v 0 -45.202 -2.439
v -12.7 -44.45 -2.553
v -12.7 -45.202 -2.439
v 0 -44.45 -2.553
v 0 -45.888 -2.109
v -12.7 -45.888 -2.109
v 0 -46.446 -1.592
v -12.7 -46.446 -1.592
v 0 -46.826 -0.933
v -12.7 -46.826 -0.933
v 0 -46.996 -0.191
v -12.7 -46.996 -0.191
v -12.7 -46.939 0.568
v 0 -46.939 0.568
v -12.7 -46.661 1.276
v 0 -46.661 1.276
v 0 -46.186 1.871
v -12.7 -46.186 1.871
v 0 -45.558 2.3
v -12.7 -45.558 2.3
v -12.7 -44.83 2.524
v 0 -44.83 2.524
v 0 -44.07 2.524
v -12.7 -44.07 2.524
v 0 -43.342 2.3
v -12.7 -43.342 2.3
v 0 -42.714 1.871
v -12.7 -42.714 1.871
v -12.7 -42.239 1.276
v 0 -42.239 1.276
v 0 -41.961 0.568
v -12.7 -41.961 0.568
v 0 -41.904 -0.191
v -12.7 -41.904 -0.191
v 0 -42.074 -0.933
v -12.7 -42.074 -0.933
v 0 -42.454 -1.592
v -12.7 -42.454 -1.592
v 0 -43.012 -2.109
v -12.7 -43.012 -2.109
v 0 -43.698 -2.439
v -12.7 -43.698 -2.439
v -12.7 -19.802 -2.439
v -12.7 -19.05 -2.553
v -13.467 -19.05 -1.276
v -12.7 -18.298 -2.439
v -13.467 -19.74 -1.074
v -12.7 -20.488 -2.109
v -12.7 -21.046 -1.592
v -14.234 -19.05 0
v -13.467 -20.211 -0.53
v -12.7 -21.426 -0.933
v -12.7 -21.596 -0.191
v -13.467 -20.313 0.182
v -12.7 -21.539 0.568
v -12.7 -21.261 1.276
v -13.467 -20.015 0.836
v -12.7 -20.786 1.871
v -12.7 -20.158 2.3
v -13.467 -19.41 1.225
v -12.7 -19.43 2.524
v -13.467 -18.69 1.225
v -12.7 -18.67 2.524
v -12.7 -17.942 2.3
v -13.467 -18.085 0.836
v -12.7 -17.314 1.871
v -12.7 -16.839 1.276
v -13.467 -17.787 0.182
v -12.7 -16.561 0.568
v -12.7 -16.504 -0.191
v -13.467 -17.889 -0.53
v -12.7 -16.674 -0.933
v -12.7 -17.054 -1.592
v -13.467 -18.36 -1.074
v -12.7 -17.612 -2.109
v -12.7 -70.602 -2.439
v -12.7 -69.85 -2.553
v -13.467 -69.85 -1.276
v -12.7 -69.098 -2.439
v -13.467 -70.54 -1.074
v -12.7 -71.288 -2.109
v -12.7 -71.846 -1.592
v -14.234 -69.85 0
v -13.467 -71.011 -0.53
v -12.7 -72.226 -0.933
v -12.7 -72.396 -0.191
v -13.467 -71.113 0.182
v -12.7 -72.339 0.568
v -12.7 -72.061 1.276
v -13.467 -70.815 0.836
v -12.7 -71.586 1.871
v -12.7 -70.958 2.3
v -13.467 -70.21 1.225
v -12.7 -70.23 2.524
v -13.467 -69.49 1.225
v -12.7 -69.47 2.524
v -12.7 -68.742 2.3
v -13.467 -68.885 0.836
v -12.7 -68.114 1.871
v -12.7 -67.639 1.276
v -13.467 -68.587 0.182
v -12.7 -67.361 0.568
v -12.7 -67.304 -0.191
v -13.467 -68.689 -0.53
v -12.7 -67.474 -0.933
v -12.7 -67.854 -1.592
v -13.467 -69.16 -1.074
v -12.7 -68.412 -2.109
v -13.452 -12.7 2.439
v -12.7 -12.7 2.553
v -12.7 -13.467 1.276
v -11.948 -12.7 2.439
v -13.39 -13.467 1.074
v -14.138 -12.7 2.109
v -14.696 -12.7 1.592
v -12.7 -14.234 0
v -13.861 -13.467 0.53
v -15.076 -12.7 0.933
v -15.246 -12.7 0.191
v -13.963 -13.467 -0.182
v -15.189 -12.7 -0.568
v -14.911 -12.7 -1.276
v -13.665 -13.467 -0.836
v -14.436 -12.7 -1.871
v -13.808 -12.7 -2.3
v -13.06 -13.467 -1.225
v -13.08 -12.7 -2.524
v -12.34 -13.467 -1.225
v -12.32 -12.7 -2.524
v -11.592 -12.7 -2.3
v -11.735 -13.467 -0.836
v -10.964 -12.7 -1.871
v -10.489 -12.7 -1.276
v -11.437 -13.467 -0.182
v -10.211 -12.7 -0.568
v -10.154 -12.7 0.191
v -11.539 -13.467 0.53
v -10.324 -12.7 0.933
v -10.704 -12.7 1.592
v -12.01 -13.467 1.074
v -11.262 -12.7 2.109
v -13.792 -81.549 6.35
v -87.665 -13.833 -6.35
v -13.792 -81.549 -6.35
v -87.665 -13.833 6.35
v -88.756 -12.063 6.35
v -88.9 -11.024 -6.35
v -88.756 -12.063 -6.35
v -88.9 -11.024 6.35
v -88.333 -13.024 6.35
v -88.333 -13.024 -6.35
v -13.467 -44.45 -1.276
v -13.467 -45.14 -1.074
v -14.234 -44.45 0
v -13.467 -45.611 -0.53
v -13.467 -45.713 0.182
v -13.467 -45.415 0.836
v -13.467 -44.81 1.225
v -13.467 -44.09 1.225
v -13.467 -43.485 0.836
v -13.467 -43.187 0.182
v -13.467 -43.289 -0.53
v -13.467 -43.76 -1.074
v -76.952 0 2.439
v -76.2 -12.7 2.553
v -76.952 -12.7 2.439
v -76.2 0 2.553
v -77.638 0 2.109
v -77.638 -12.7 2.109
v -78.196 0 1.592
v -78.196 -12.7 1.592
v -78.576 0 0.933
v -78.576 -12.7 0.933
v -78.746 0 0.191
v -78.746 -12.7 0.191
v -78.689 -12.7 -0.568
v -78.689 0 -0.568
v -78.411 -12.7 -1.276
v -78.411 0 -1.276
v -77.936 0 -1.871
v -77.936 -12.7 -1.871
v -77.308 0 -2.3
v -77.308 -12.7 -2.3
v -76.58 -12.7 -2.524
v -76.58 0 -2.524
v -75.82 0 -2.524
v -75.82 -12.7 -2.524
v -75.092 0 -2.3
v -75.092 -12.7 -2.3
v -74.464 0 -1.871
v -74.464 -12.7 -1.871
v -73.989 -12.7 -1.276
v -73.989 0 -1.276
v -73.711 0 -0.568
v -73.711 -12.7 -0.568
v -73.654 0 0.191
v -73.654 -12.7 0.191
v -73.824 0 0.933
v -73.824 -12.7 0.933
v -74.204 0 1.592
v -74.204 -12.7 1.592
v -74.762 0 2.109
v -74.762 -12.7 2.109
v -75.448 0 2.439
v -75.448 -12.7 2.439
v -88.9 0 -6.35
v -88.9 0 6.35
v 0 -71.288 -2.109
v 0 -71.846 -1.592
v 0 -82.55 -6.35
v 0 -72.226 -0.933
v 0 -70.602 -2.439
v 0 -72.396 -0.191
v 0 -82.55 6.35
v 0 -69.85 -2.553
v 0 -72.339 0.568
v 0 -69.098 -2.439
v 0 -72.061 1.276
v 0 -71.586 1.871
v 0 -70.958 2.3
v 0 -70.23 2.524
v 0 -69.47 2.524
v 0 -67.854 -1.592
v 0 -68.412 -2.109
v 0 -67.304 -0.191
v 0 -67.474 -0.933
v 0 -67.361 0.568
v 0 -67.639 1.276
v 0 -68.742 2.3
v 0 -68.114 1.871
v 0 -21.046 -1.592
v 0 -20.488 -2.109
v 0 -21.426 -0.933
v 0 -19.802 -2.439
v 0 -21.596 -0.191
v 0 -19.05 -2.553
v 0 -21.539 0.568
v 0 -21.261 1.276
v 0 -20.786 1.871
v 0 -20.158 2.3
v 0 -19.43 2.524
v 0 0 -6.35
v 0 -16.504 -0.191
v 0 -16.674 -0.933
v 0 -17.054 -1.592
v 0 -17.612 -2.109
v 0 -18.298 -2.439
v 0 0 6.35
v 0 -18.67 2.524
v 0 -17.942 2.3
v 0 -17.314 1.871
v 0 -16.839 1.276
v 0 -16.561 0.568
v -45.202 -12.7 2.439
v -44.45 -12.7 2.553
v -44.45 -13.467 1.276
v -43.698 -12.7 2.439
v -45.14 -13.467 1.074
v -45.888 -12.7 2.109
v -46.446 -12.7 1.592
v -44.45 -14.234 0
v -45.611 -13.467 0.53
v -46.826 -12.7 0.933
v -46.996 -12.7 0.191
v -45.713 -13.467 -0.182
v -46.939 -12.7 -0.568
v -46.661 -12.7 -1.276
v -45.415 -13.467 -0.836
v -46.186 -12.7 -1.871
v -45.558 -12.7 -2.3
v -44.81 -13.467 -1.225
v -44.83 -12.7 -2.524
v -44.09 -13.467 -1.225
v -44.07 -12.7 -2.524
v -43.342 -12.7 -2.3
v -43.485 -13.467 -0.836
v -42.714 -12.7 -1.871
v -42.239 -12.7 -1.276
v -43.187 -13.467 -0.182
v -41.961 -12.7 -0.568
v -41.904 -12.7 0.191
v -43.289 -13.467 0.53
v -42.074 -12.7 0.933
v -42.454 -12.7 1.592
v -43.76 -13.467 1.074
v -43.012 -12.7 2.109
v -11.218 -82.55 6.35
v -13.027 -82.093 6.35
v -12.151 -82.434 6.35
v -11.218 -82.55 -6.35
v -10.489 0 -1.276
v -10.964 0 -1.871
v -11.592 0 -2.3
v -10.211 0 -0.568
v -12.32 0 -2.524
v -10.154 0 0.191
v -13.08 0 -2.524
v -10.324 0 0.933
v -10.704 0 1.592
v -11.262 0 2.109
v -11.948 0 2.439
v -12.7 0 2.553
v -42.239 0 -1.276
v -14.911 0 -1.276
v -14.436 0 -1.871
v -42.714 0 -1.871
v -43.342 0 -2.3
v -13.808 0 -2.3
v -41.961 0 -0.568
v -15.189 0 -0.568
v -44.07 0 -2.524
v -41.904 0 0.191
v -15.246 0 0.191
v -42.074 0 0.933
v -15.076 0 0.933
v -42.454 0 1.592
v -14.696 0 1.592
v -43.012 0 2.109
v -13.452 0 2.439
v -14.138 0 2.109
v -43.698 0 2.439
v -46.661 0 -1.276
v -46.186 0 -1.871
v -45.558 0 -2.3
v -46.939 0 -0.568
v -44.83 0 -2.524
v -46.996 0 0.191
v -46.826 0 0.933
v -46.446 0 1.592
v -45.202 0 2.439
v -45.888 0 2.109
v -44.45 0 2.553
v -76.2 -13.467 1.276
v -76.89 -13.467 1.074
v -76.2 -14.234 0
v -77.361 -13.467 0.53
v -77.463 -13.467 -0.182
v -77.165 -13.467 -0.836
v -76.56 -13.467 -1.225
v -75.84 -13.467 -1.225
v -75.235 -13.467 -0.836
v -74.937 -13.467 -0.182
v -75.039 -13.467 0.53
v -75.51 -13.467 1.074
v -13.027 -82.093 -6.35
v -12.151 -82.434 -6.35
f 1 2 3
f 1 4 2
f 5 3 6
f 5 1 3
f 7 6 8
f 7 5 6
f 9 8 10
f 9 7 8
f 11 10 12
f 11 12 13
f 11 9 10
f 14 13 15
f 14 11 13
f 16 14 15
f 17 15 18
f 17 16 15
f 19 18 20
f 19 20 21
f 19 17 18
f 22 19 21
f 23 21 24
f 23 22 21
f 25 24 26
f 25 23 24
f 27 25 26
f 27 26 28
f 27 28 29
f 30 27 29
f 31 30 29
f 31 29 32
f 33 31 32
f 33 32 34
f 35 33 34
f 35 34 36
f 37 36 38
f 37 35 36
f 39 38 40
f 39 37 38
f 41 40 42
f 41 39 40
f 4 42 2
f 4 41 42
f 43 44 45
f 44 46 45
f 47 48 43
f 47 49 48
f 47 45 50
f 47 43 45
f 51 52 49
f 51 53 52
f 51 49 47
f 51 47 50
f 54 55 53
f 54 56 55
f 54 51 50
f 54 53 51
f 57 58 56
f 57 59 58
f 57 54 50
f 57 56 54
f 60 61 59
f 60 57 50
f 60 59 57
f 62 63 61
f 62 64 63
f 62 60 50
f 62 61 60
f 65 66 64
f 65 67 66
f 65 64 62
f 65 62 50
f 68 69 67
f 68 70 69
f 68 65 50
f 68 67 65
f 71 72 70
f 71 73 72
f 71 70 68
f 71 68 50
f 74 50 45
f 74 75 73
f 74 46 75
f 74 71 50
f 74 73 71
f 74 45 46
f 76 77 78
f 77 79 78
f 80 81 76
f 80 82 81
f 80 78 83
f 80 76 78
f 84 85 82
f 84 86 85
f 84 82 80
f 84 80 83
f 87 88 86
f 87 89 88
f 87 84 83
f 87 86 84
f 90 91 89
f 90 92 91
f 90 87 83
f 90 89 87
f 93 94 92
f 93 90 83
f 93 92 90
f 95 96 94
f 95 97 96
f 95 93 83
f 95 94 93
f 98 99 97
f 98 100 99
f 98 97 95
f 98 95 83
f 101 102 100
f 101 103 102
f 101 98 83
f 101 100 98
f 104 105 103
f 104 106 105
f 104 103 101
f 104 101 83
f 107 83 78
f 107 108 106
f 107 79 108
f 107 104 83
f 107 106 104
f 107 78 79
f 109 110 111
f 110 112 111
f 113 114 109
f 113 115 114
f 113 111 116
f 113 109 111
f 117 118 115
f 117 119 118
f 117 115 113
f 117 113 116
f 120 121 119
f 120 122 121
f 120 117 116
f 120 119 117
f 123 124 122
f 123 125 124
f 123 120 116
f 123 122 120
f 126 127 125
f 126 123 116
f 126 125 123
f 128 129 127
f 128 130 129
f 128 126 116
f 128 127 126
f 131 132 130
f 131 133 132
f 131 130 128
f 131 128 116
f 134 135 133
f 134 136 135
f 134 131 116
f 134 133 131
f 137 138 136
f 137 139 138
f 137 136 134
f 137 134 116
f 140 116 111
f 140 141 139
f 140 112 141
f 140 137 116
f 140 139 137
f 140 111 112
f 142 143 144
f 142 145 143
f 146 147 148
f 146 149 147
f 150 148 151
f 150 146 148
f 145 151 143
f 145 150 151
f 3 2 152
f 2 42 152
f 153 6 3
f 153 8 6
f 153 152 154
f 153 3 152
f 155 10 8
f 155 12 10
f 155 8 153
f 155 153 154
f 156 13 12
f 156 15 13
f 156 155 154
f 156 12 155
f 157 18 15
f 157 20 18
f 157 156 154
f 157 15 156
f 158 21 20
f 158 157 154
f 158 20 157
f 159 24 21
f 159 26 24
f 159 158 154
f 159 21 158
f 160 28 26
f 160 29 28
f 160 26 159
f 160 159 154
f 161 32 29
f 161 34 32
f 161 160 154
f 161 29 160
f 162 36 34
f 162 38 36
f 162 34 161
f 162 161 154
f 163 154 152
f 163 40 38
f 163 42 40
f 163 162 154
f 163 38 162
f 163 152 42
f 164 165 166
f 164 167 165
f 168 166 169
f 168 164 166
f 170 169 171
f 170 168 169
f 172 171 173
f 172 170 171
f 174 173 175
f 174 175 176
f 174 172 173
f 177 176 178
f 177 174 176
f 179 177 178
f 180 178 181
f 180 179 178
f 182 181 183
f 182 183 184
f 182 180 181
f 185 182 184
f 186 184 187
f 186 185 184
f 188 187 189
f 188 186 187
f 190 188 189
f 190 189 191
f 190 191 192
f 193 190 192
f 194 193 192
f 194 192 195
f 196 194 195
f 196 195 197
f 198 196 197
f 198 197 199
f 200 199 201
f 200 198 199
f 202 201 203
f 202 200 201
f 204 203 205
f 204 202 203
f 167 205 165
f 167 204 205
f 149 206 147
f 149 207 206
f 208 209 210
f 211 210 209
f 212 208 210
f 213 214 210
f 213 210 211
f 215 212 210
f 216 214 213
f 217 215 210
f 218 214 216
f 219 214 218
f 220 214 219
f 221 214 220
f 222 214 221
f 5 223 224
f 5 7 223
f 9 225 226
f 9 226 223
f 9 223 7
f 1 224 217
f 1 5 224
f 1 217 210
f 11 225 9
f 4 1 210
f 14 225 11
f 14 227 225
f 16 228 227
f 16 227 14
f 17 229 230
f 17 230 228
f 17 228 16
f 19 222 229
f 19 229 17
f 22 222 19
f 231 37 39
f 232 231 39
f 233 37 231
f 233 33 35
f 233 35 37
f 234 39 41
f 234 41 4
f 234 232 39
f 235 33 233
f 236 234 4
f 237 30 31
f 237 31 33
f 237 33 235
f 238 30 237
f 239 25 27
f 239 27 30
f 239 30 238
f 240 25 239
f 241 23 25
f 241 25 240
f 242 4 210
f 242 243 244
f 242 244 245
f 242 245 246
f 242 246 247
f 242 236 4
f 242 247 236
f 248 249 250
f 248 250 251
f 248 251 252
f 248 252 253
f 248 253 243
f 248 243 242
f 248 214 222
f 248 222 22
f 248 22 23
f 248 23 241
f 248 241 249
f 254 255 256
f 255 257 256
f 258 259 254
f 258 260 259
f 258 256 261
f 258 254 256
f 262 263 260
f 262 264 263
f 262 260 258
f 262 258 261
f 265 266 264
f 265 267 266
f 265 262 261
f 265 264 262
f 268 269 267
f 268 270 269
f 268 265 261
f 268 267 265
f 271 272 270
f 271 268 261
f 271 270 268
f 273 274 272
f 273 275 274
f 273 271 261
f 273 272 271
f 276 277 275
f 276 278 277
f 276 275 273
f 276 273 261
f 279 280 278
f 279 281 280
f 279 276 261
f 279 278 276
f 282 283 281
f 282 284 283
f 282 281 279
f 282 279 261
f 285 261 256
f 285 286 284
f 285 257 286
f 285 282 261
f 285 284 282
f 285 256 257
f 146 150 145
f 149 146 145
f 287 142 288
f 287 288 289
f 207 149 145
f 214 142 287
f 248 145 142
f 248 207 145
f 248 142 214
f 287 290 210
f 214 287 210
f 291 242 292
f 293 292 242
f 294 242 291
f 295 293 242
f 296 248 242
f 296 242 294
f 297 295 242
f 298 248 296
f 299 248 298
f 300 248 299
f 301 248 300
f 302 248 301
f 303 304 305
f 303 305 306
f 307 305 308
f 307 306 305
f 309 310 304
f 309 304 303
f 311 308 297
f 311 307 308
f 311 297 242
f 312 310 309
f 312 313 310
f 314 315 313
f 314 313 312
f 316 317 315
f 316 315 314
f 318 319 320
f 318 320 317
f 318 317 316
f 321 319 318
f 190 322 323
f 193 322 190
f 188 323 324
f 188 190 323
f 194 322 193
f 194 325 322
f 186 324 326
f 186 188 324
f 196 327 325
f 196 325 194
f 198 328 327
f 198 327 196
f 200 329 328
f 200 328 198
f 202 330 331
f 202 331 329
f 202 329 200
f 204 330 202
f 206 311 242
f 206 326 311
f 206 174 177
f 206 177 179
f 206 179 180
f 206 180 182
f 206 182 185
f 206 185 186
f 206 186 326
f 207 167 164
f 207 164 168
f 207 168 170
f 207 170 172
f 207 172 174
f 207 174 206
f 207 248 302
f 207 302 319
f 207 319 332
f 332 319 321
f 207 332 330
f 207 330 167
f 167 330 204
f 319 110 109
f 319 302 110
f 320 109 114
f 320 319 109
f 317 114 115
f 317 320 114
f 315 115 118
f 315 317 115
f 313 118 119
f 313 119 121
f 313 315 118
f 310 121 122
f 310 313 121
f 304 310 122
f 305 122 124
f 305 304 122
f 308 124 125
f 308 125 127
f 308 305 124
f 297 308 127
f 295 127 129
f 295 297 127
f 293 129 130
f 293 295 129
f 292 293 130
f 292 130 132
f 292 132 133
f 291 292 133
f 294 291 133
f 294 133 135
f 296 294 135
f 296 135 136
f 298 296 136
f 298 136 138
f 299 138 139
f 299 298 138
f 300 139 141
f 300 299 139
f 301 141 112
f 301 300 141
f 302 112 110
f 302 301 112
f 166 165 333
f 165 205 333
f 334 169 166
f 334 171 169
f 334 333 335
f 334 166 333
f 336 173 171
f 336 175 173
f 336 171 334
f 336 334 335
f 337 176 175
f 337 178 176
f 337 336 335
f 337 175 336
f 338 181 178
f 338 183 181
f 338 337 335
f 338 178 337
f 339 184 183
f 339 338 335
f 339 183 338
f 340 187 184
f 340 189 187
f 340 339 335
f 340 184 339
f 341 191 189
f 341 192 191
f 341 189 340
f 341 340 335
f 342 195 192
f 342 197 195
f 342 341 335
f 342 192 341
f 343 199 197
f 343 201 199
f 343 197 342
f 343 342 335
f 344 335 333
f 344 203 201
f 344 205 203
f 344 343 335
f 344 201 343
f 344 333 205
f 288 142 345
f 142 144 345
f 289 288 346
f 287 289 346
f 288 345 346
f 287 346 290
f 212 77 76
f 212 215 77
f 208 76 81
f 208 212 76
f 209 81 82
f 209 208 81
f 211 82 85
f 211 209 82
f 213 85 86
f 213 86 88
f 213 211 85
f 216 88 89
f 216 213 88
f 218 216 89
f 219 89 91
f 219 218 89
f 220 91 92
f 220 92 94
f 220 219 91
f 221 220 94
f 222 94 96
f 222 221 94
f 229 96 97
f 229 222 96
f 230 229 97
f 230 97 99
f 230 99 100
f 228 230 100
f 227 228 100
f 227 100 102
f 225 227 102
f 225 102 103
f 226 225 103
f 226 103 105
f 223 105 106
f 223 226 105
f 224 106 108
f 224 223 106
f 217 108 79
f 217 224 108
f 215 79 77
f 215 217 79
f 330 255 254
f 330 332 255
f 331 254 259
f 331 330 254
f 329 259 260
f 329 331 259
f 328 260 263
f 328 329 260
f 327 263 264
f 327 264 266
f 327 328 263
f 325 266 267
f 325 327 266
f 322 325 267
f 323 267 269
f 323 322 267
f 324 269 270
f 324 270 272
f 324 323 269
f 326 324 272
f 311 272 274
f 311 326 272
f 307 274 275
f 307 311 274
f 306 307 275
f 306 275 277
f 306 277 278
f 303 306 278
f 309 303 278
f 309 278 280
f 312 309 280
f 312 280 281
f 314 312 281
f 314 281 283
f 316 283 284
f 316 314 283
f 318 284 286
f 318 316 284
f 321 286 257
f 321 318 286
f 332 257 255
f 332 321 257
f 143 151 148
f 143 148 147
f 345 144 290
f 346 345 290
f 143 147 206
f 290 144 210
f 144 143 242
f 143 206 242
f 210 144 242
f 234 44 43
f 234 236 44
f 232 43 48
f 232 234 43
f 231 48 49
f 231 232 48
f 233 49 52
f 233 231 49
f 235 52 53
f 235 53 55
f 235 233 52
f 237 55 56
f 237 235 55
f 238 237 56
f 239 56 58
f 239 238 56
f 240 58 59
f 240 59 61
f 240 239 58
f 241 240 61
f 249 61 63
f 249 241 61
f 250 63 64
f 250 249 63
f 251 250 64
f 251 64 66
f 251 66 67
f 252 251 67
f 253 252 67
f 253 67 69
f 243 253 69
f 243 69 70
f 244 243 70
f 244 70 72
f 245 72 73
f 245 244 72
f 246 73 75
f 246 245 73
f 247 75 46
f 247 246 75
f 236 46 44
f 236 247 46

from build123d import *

# Parameters (mm, degrees)
BOSS_EXTRUDE1_DEPTH = 6.35
LPATTERN1_COUNT     = 3
LPATTERN1_PITCH     = 31.75
LPATTERN2_COUNT     = 3
LPATTERN2_PITCH     = 25.4
FILLET1_R           = 3.81


with BuildPart() as part:
    # Sketch1 → Boss-Extrude1 (new, symmetric)
    with BuildSketch(Plane.XY):
        Polygon((0, 0), (-88.9, 0), (-88.9, -12.7), (-12.7, -82.55), (0, -82.55), align=None)
    extrude(amount=BOSS_EXTRUDE1_DEPTH, both=True)

    # Sketch3 → Tap Drill for 1/4-20 Tap1 (revolve, cut)
    with BuildSketch(Plane(origin=(-76.2, 0, 0), x_dir=(0, 0, 1), z_dir=(1, 0, 0))):
        Polygon((0, 0), (0, 14.233816902), (2.5527, 12.7), (2.5527, 0), align=None)
    tap_drill_for_1_4_20_tap1 = revolve(axis=Axis((-76.2, 6.35, 0), (0, -1, 0)), mode=Mode.SUBTRACT)

    # LPattern1: Tap Drill for 1/4-20 Tap1 ×3
    with Locations(*[(i * LPATTERN1_PITCH, 0, 0) for i in range(1, LPATTERN1_COUNT)]):
        add(tap_drill_for_1_4_20_tap1, mode=Mode.SUBTRACT)

    # Sketch5 → Tap Drill for 1/4-20 Tap2 (revolve, cut)
    with BuildSketch(Plane(origin=(0, -69.85, 0), x_dir=(0, 0, -1), z_dir=(0, 1, 0))):
        Polygon((0, 0), (0, 14.233816902), (2.5527, 12.7), (2.5527, 0), align=None)
    tap_drill_for_1_4_20_tap2 = revolve(axis=Axis((6.35, -69.85, 0), (-1, 0, 0)), mode=Mode.SUBTRACT)

    # LPattern2: Tap Drill for 1/4-20 Tap2 ×3
    with Locations(*[(0, i * LPATTERN2_PITCH, 0) for i in range(1, LPATTERN2_COUNT)]):
        add(tap_drill_for_1_4_20_tap2, mode=Mode.SUBTRACT)

    # Fillet1
    fillet1_edges = [part.edges().sort_by_distance(p)[0] for p in [
        (-12.7, -82.55, 0),
        (-88.9, -12.7, 0),
    ]]
    fillet(fillet1_edges, radius=FILLET1_R)


solid = part.part
